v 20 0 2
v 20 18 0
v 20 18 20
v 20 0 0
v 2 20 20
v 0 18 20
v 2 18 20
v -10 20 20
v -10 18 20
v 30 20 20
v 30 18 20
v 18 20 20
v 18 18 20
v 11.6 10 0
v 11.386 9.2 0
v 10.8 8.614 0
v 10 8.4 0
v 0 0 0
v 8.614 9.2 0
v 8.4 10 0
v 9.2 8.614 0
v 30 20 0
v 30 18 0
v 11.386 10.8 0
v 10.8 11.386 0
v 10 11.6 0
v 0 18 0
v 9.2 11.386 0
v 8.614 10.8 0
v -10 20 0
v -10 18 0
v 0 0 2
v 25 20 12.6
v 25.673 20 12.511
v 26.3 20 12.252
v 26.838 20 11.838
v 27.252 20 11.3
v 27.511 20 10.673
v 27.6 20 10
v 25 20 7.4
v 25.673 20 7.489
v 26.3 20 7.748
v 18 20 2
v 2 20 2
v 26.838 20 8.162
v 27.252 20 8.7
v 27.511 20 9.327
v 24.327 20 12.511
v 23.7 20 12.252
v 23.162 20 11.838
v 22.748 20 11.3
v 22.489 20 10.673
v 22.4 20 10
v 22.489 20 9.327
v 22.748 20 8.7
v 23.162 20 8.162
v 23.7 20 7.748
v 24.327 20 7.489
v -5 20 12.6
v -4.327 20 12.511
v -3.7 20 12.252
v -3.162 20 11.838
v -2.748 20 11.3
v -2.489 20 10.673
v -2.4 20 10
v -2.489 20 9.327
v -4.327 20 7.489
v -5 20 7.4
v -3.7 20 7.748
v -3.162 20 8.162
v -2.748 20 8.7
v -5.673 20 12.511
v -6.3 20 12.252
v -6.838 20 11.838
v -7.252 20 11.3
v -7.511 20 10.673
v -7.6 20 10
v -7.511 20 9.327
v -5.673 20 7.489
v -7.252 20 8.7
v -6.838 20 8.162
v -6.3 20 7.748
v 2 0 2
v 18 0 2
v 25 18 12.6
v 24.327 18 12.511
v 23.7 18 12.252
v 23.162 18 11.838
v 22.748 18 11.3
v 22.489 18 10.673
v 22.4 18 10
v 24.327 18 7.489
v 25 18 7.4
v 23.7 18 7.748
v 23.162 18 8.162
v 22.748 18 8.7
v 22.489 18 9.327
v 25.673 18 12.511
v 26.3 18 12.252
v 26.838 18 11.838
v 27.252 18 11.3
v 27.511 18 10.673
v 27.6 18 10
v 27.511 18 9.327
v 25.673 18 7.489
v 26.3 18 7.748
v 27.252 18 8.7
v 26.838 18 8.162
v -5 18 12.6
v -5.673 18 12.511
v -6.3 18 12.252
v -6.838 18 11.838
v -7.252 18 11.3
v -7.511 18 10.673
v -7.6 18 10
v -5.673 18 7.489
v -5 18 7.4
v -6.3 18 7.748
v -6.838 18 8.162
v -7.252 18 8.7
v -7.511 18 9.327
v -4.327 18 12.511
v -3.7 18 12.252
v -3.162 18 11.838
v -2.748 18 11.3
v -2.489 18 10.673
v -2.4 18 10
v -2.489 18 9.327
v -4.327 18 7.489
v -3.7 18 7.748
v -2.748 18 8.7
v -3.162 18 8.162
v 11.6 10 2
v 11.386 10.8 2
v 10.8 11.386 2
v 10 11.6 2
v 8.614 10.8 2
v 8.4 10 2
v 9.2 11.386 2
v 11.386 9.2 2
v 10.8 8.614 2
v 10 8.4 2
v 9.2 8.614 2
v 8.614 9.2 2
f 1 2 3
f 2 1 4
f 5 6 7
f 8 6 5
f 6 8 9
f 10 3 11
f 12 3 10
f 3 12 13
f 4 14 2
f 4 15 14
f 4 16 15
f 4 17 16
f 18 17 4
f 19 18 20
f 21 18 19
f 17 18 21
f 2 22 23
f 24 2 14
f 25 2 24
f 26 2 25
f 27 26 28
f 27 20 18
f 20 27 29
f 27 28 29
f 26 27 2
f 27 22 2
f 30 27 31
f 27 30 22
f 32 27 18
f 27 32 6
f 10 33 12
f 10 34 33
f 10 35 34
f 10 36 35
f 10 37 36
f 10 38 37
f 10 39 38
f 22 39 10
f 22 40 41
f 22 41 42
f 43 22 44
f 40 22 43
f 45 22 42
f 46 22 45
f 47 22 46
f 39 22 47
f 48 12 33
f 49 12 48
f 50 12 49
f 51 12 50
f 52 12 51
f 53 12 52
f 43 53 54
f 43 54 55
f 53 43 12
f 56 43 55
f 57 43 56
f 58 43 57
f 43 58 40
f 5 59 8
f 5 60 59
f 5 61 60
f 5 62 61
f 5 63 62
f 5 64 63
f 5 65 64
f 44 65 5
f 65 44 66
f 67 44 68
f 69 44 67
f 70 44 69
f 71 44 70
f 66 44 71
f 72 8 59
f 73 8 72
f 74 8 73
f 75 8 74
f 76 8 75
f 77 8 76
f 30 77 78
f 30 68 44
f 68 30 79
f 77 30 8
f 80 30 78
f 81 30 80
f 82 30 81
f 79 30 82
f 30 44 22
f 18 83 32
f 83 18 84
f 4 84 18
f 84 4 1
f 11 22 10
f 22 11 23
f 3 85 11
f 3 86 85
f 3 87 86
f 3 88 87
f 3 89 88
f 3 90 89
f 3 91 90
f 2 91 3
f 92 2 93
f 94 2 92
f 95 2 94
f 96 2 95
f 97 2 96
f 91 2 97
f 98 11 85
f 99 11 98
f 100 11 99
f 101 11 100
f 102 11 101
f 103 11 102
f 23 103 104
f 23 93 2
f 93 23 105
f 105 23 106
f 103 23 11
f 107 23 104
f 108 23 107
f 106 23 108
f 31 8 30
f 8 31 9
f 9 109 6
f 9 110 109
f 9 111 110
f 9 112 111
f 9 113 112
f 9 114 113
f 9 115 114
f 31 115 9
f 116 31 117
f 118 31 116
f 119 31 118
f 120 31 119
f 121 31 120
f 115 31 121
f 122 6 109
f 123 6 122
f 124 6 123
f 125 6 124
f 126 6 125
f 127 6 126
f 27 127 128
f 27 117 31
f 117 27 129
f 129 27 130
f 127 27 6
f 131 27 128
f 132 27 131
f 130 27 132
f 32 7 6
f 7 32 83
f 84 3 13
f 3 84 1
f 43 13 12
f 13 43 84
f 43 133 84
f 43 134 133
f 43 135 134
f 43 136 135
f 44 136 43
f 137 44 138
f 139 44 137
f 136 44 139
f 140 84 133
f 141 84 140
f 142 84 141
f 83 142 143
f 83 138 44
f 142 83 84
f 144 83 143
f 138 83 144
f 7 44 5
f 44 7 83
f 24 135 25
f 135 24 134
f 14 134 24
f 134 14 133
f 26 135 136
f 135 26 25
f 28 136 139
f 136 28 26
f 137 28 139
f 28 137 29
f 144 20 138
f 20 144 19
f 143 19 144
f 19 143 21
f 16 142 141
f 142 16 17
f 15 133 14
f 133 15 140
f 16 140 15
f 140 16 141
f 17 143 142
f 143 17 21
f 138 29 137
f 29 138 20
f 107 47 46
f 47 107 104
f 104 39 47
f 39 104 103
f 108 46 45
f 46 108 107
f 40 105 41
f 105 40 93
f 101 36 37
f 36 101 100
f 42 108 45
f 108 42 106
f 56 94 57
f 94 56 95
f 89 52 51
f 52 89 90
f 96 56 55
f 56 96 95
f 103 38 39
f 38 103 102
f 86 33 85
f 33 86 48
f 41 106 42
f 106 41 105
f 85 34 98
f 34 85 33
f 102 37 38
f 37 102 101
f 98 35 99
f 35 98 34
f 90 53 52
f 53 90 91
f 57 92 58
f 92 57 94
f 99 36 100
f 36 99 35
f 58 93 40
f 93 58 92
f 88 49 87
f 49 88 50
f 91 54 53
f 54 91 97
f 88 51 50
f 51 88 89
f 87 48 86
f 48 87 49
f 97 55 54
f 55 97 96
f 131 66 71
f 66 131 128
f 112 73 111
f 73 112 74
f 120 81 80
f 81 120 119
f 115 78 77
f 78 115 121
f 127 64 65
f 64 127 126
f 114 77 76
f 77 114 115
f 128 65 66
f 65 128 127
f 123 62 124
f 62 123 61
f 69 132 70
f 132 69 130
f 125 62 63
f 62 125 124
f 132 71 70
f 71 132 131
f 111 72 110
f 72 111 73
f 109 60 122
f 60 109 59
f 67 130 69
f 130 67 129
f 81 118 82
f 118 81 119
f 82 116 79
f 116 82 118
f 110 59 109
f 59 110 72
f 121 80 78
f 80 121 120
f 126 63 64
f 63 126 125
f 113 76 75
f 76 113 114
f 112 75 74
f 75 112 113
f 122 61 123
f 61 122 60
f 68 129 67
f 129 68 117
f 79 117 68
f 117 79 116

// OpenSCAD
difference()
{
    union()
    {
        cube([20,20,20]);
        
        translate([20,18,0])
            cube([10,2,20]);
        
        translate([-10,18,0])
            cube([10,2,20]);
    }
    
    union()
    {
        translate([0,0,2])
            rotate([45,0,0])
                cube([20,30,20]);
        
        translate([2,0,2])
            cube([16,20,18]);
        
        translate([10,10,0])
            cylinder(d=3.2,h=2,$fn=12);
        
        translate([25,18,10])
            rotate([270,0,0])
                cylinder(d=5.2,h=2,$fn=24);
        
        translate([-5,18,10])
            rotate([270,0,0])
                cylinder(d=5.2,h=2,$fn=24);
    }

}
